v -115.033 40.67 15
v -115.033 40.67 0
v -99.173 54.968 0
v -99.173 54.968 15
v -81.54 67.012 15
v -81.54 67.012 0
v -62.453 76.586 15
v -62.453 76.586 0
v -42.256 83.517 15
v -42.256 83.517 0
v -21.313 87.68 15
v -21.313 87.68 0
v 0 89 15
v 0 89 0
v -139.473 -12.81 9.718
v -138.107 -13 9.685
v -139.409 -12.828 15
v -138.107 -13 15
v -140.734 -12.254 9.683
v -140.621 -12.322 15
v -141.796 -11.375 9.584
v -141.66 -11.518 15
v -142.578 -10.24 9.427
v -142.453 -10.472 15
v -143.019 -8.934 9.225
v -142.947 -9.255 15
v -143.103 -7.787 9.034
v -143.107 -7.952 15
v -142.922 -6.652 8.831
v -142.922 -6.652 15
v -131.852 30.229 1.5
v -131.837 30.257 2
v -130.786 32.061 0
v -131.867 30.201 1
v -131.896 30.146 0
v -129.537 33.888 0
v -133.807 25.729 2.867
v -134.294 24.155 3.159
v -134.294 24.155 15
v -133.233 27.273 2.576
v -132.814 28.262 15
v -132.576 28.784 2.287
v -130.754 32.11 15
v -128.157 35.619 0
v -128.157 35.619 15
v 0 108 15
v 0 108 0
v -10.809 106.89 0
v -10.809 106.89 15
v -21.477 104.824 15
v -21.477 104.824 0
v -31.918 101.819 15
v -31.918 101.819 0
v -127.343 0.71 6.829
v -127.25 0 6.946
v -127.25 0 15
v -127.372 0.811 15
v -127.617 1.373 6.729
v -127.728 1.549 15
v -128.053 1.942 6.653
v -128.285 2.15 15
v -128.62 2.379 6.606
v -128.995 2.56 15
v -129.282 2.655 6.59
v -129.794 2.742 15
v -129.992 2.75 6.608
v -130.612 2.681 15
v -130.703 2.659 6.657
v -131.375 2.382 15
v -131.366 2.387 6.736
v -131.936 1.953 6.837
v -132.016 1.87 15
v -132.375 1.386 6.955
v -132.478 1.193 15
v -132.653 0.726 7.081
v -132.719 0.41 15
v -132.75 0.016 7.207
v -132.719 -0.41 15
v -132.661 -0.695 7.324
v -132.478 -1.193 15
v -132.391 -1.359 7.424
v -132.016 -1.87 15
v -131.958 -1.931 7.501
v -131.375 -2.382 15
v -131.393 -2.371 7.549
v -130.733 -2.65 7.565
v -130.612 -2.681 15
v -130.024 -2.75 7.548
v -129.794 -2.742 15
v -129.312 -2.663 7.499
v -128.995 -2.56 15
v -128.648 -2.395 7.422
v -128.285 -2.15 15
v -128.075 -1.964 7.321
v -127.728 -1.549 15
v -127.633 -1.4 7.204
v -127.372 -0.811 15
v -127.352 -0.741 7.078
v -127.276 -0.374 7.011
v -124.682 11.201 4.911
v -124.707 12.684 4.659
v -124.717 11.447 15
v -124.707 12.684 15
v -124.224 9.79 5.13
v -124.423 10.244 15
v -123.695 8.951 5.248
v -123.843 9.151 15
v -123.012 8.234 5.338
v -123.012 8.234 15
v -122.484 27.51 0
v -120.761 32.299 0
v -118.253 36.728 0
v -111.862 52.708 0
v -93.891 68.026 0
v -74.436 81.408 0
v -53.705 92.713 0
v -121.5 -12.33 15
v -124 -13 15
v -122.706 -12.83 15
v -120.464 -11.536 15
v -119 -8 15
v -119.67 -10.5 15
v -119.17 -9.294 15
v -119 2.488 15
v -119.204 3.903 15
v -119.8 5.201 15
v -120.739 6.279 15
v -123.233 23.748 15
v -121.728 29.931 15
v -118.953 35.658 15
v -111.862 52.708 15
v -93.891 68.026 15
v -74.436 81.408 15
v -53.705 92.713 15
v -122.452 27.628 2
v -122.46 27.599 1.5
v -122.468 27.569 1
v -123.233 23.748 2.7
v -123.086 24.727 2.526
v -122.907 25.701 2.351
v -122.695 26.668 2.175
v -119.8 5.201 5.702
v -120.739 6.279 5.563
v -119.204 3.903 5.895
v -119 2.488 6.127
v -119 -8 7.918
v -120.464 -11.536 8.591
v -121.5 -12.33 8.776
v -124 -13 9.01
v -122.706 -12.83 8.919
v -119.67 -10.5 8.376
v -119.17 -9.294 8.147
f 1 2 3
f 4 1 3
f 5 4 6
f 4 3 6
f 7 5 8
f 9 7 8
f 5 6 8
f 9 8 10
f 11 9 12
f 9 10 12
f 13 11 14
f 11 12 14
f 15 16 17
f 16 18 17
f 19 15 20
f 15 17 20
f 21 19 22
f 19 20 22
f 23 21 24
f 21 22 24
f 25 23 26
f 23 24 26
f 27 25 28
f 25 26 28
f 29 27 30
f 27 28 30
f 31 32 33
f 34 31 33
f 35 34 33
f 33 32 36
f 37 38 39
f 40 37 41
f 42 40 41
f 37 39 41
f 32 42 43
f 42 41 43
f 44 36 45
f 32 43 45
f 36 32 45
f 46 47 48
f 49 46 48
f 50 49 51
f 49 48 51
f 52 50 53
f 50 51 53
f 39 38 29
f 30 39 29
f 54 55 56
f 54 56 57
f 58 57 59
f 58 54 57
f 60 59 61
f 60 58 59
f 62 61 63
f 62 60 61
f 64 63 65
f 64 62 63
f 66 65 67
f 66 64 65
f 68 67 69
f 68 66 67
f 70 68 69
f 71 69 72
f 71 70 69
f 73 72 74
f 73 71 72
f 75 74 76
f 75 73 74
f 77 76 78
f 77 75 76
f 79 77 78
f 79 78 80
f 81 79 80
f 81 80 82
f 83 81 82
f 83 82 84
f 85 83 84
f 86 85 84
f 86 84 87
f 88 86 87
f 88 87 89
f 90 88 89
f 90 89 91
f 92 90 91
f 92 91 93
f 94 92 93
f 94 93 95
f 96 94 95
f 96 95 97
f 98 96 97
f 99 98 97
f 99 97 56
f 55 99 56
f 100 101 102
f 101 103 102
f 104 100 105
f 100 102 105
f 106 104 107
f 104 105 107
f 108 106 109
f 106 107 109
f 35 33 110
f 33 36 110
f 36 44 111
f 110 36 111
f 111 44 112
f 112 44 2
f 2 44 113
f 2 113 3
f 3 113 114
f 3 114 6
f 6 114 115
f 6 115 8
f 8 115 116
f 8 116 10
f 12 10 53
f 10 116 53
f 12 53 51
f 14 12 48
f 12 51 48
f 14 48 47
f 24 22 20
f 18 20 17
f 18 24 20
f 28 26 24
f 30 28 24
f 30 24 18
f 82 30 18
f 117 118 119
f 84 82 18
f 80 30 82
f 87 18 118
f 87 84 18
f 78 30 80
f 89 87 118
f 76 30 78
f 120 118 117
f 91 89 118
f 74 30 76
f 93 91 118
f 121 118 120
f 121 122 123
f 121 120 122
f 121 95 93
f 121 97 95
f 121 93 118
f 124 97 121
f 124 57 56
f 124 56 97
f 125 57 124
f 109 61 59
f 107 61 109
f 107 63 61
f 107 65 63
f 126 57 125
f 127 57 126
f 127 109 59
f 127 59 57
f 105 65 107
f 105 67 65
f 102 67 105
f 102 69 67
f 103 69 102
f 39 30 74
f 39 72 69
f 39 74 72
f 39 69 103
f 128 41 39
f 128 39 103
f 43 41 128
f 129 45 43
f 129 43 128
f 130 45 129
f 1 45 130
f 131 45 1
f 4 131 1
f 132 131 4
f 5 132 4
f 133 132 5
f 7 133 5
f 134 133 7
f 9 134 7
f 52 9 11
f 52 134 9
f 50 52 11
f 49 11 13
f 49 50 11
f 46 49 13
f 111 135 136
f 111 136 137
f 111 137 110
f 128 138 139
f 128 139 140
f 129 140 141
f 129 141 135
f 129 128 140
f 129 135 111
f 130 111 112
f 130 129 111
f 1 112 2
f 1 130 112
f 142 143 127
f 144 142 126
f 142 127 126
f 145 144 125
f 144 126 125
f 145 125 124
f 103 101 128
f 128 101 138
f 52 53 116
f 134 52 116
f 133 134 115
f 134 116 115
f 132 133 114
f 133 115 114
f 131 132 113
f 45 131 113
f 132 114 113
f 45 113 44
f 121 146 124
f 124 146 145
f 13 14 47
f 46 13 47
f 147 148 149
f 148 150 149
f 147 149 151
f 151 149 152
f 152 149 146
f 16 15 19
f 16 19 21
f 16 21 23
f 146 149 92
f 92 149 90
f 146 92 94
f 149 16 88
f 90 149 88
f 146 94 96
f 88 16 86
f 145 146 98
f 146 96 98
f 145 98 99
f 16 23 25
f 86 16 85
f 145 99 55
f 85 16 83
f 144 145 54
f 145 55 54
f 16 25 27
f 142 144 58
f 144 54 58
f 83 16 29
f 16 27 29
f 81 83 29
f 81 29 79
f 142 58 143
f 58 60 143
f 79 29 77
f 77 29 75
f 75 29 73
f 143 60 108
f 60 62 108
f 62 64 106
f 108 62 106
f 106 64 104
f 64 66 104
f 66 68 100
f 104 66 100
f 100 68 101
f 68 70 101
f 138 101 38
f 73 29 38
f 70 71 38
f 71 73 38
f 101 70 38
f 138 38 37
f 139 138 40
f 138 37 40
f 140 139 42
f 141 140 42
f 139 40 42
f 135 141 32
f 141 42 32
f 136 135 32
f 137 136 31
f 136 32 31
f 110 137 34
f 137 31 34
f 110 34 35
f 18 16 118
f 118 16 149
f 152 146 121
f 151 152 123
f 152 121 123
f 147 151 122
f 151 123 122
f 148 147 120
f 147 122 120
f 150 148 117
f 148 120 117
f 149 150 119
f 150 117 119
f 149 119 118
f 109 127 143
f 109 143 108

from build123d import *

# Parameters (mm, degrees)
ESQUISSE2_R             = 2.75
BOSS_EXTRU_1_DEPTH      = 15
ENL_V_MAT_EXTRU_1_DEPTH = 36
CONG_1_R                = 30
CONG_2_R                = 30
CONG_3_R                = 5
CONG_4_R                = 5
CONG_5_R                = 5
CONG_6_R                = 5


with BuildPart() as part:
    # Esquisse2 → Boss.-Extru.1 (new body)
    with BuildSketch(Plane.XY):
        with BuildLine():
            Line((-125.064319956, 10), (-122, 33))
            ThreePointArc((-122, 33), (-67.197277761, 74.501212265), (0, 89))
            Line((0, 89), (0, 108))
            ThreePointArc((0, 108), (-16.165722488, 105.975834437), (-31.918403878, 101.818809198))
            ThreePointArc((-31.918403878, 101.818809198), (-87.157005326, 72.996548183), (-132.564319956, 30.332727469))
            Line((-132.564319956, 30.332727469), (-144.7, -13))
            Line((-144.7, -13), (-119, -13))
            Line((-119, -13), (-119, 4.782335439))
            Line((-119, 4.782335439), (-125.064319956, 10))
        make_face()
        with Locations((-130, 0)):
            Circle(ESQUISSE2_R, mode=Mode.SUBTRACT)
    extrude(amount=BOSS_EXTRU_1_DEPTH)

    # Esquisse5 → Enlèv. mat.-Extru.1 (cut)
    with BuildSketch(Plane(origin=(-130.800251379, 36.631666021, 0), x_dir=(0, 0, 1), z_dir=(-0.9629494993021883, 0.2696817787572327, 0))):
        Polygon((0, -51.541296877), (10, -51.541296877), (2, -6.418445839), (0, -6.541296877), align=None)
    extrude(amount=-ENL_V_MAT_EXTRU_1_DEPTH, mode=Mode.SUBTRACT)

    # Congé1
    cong_1_edges = [part.edges().sort_by_distance(p)[0] for p in [
        (-132.564319956, 30.332727469, 8.510890361),
    ]]
    fillet(cong_1_edges, radius=CONG_1_R)

    # Congé2
    cong_2_edges = [part.edges().sort_by_distance(p)[0] for p in [
        (-122, 33, 7.5),
    ]]
    fillet(cong_2_edges, radius=CONG_2_R)

    # Congé3
    cong_3_edges = [part.edges().sort_by_distance(p)[0] for p in [
        (-125.064319956, 10, 10.067243827),
    ]]
    fillet(cong_3_edges, radius=CONG_3_R)

    # Congé4
    cong_4_edges = [part.edges().sort_by_distance(p)[0] for p in [
        (-119, 4.782335439, 10.367660206),
    ]]
    fillet(cong_4_edges, radius=CONG_4_R)

    # Congé5
    cong_5_edges = [part.edges().sort_by_distance(p)[0] for p in [
        (-119, -13, 11.885604273),
    ]]
    fillet(cong_5_edges, radius=CONG_5_R)

    # Congé6
    cong_6_edges = [part.edges().sort_by_distance(p)[0] for p in [
        (-144.7, -13, 12.5),
    ]]
    fillet(cong_6_edges, radius=CONG_6_R)


solid = part.part
